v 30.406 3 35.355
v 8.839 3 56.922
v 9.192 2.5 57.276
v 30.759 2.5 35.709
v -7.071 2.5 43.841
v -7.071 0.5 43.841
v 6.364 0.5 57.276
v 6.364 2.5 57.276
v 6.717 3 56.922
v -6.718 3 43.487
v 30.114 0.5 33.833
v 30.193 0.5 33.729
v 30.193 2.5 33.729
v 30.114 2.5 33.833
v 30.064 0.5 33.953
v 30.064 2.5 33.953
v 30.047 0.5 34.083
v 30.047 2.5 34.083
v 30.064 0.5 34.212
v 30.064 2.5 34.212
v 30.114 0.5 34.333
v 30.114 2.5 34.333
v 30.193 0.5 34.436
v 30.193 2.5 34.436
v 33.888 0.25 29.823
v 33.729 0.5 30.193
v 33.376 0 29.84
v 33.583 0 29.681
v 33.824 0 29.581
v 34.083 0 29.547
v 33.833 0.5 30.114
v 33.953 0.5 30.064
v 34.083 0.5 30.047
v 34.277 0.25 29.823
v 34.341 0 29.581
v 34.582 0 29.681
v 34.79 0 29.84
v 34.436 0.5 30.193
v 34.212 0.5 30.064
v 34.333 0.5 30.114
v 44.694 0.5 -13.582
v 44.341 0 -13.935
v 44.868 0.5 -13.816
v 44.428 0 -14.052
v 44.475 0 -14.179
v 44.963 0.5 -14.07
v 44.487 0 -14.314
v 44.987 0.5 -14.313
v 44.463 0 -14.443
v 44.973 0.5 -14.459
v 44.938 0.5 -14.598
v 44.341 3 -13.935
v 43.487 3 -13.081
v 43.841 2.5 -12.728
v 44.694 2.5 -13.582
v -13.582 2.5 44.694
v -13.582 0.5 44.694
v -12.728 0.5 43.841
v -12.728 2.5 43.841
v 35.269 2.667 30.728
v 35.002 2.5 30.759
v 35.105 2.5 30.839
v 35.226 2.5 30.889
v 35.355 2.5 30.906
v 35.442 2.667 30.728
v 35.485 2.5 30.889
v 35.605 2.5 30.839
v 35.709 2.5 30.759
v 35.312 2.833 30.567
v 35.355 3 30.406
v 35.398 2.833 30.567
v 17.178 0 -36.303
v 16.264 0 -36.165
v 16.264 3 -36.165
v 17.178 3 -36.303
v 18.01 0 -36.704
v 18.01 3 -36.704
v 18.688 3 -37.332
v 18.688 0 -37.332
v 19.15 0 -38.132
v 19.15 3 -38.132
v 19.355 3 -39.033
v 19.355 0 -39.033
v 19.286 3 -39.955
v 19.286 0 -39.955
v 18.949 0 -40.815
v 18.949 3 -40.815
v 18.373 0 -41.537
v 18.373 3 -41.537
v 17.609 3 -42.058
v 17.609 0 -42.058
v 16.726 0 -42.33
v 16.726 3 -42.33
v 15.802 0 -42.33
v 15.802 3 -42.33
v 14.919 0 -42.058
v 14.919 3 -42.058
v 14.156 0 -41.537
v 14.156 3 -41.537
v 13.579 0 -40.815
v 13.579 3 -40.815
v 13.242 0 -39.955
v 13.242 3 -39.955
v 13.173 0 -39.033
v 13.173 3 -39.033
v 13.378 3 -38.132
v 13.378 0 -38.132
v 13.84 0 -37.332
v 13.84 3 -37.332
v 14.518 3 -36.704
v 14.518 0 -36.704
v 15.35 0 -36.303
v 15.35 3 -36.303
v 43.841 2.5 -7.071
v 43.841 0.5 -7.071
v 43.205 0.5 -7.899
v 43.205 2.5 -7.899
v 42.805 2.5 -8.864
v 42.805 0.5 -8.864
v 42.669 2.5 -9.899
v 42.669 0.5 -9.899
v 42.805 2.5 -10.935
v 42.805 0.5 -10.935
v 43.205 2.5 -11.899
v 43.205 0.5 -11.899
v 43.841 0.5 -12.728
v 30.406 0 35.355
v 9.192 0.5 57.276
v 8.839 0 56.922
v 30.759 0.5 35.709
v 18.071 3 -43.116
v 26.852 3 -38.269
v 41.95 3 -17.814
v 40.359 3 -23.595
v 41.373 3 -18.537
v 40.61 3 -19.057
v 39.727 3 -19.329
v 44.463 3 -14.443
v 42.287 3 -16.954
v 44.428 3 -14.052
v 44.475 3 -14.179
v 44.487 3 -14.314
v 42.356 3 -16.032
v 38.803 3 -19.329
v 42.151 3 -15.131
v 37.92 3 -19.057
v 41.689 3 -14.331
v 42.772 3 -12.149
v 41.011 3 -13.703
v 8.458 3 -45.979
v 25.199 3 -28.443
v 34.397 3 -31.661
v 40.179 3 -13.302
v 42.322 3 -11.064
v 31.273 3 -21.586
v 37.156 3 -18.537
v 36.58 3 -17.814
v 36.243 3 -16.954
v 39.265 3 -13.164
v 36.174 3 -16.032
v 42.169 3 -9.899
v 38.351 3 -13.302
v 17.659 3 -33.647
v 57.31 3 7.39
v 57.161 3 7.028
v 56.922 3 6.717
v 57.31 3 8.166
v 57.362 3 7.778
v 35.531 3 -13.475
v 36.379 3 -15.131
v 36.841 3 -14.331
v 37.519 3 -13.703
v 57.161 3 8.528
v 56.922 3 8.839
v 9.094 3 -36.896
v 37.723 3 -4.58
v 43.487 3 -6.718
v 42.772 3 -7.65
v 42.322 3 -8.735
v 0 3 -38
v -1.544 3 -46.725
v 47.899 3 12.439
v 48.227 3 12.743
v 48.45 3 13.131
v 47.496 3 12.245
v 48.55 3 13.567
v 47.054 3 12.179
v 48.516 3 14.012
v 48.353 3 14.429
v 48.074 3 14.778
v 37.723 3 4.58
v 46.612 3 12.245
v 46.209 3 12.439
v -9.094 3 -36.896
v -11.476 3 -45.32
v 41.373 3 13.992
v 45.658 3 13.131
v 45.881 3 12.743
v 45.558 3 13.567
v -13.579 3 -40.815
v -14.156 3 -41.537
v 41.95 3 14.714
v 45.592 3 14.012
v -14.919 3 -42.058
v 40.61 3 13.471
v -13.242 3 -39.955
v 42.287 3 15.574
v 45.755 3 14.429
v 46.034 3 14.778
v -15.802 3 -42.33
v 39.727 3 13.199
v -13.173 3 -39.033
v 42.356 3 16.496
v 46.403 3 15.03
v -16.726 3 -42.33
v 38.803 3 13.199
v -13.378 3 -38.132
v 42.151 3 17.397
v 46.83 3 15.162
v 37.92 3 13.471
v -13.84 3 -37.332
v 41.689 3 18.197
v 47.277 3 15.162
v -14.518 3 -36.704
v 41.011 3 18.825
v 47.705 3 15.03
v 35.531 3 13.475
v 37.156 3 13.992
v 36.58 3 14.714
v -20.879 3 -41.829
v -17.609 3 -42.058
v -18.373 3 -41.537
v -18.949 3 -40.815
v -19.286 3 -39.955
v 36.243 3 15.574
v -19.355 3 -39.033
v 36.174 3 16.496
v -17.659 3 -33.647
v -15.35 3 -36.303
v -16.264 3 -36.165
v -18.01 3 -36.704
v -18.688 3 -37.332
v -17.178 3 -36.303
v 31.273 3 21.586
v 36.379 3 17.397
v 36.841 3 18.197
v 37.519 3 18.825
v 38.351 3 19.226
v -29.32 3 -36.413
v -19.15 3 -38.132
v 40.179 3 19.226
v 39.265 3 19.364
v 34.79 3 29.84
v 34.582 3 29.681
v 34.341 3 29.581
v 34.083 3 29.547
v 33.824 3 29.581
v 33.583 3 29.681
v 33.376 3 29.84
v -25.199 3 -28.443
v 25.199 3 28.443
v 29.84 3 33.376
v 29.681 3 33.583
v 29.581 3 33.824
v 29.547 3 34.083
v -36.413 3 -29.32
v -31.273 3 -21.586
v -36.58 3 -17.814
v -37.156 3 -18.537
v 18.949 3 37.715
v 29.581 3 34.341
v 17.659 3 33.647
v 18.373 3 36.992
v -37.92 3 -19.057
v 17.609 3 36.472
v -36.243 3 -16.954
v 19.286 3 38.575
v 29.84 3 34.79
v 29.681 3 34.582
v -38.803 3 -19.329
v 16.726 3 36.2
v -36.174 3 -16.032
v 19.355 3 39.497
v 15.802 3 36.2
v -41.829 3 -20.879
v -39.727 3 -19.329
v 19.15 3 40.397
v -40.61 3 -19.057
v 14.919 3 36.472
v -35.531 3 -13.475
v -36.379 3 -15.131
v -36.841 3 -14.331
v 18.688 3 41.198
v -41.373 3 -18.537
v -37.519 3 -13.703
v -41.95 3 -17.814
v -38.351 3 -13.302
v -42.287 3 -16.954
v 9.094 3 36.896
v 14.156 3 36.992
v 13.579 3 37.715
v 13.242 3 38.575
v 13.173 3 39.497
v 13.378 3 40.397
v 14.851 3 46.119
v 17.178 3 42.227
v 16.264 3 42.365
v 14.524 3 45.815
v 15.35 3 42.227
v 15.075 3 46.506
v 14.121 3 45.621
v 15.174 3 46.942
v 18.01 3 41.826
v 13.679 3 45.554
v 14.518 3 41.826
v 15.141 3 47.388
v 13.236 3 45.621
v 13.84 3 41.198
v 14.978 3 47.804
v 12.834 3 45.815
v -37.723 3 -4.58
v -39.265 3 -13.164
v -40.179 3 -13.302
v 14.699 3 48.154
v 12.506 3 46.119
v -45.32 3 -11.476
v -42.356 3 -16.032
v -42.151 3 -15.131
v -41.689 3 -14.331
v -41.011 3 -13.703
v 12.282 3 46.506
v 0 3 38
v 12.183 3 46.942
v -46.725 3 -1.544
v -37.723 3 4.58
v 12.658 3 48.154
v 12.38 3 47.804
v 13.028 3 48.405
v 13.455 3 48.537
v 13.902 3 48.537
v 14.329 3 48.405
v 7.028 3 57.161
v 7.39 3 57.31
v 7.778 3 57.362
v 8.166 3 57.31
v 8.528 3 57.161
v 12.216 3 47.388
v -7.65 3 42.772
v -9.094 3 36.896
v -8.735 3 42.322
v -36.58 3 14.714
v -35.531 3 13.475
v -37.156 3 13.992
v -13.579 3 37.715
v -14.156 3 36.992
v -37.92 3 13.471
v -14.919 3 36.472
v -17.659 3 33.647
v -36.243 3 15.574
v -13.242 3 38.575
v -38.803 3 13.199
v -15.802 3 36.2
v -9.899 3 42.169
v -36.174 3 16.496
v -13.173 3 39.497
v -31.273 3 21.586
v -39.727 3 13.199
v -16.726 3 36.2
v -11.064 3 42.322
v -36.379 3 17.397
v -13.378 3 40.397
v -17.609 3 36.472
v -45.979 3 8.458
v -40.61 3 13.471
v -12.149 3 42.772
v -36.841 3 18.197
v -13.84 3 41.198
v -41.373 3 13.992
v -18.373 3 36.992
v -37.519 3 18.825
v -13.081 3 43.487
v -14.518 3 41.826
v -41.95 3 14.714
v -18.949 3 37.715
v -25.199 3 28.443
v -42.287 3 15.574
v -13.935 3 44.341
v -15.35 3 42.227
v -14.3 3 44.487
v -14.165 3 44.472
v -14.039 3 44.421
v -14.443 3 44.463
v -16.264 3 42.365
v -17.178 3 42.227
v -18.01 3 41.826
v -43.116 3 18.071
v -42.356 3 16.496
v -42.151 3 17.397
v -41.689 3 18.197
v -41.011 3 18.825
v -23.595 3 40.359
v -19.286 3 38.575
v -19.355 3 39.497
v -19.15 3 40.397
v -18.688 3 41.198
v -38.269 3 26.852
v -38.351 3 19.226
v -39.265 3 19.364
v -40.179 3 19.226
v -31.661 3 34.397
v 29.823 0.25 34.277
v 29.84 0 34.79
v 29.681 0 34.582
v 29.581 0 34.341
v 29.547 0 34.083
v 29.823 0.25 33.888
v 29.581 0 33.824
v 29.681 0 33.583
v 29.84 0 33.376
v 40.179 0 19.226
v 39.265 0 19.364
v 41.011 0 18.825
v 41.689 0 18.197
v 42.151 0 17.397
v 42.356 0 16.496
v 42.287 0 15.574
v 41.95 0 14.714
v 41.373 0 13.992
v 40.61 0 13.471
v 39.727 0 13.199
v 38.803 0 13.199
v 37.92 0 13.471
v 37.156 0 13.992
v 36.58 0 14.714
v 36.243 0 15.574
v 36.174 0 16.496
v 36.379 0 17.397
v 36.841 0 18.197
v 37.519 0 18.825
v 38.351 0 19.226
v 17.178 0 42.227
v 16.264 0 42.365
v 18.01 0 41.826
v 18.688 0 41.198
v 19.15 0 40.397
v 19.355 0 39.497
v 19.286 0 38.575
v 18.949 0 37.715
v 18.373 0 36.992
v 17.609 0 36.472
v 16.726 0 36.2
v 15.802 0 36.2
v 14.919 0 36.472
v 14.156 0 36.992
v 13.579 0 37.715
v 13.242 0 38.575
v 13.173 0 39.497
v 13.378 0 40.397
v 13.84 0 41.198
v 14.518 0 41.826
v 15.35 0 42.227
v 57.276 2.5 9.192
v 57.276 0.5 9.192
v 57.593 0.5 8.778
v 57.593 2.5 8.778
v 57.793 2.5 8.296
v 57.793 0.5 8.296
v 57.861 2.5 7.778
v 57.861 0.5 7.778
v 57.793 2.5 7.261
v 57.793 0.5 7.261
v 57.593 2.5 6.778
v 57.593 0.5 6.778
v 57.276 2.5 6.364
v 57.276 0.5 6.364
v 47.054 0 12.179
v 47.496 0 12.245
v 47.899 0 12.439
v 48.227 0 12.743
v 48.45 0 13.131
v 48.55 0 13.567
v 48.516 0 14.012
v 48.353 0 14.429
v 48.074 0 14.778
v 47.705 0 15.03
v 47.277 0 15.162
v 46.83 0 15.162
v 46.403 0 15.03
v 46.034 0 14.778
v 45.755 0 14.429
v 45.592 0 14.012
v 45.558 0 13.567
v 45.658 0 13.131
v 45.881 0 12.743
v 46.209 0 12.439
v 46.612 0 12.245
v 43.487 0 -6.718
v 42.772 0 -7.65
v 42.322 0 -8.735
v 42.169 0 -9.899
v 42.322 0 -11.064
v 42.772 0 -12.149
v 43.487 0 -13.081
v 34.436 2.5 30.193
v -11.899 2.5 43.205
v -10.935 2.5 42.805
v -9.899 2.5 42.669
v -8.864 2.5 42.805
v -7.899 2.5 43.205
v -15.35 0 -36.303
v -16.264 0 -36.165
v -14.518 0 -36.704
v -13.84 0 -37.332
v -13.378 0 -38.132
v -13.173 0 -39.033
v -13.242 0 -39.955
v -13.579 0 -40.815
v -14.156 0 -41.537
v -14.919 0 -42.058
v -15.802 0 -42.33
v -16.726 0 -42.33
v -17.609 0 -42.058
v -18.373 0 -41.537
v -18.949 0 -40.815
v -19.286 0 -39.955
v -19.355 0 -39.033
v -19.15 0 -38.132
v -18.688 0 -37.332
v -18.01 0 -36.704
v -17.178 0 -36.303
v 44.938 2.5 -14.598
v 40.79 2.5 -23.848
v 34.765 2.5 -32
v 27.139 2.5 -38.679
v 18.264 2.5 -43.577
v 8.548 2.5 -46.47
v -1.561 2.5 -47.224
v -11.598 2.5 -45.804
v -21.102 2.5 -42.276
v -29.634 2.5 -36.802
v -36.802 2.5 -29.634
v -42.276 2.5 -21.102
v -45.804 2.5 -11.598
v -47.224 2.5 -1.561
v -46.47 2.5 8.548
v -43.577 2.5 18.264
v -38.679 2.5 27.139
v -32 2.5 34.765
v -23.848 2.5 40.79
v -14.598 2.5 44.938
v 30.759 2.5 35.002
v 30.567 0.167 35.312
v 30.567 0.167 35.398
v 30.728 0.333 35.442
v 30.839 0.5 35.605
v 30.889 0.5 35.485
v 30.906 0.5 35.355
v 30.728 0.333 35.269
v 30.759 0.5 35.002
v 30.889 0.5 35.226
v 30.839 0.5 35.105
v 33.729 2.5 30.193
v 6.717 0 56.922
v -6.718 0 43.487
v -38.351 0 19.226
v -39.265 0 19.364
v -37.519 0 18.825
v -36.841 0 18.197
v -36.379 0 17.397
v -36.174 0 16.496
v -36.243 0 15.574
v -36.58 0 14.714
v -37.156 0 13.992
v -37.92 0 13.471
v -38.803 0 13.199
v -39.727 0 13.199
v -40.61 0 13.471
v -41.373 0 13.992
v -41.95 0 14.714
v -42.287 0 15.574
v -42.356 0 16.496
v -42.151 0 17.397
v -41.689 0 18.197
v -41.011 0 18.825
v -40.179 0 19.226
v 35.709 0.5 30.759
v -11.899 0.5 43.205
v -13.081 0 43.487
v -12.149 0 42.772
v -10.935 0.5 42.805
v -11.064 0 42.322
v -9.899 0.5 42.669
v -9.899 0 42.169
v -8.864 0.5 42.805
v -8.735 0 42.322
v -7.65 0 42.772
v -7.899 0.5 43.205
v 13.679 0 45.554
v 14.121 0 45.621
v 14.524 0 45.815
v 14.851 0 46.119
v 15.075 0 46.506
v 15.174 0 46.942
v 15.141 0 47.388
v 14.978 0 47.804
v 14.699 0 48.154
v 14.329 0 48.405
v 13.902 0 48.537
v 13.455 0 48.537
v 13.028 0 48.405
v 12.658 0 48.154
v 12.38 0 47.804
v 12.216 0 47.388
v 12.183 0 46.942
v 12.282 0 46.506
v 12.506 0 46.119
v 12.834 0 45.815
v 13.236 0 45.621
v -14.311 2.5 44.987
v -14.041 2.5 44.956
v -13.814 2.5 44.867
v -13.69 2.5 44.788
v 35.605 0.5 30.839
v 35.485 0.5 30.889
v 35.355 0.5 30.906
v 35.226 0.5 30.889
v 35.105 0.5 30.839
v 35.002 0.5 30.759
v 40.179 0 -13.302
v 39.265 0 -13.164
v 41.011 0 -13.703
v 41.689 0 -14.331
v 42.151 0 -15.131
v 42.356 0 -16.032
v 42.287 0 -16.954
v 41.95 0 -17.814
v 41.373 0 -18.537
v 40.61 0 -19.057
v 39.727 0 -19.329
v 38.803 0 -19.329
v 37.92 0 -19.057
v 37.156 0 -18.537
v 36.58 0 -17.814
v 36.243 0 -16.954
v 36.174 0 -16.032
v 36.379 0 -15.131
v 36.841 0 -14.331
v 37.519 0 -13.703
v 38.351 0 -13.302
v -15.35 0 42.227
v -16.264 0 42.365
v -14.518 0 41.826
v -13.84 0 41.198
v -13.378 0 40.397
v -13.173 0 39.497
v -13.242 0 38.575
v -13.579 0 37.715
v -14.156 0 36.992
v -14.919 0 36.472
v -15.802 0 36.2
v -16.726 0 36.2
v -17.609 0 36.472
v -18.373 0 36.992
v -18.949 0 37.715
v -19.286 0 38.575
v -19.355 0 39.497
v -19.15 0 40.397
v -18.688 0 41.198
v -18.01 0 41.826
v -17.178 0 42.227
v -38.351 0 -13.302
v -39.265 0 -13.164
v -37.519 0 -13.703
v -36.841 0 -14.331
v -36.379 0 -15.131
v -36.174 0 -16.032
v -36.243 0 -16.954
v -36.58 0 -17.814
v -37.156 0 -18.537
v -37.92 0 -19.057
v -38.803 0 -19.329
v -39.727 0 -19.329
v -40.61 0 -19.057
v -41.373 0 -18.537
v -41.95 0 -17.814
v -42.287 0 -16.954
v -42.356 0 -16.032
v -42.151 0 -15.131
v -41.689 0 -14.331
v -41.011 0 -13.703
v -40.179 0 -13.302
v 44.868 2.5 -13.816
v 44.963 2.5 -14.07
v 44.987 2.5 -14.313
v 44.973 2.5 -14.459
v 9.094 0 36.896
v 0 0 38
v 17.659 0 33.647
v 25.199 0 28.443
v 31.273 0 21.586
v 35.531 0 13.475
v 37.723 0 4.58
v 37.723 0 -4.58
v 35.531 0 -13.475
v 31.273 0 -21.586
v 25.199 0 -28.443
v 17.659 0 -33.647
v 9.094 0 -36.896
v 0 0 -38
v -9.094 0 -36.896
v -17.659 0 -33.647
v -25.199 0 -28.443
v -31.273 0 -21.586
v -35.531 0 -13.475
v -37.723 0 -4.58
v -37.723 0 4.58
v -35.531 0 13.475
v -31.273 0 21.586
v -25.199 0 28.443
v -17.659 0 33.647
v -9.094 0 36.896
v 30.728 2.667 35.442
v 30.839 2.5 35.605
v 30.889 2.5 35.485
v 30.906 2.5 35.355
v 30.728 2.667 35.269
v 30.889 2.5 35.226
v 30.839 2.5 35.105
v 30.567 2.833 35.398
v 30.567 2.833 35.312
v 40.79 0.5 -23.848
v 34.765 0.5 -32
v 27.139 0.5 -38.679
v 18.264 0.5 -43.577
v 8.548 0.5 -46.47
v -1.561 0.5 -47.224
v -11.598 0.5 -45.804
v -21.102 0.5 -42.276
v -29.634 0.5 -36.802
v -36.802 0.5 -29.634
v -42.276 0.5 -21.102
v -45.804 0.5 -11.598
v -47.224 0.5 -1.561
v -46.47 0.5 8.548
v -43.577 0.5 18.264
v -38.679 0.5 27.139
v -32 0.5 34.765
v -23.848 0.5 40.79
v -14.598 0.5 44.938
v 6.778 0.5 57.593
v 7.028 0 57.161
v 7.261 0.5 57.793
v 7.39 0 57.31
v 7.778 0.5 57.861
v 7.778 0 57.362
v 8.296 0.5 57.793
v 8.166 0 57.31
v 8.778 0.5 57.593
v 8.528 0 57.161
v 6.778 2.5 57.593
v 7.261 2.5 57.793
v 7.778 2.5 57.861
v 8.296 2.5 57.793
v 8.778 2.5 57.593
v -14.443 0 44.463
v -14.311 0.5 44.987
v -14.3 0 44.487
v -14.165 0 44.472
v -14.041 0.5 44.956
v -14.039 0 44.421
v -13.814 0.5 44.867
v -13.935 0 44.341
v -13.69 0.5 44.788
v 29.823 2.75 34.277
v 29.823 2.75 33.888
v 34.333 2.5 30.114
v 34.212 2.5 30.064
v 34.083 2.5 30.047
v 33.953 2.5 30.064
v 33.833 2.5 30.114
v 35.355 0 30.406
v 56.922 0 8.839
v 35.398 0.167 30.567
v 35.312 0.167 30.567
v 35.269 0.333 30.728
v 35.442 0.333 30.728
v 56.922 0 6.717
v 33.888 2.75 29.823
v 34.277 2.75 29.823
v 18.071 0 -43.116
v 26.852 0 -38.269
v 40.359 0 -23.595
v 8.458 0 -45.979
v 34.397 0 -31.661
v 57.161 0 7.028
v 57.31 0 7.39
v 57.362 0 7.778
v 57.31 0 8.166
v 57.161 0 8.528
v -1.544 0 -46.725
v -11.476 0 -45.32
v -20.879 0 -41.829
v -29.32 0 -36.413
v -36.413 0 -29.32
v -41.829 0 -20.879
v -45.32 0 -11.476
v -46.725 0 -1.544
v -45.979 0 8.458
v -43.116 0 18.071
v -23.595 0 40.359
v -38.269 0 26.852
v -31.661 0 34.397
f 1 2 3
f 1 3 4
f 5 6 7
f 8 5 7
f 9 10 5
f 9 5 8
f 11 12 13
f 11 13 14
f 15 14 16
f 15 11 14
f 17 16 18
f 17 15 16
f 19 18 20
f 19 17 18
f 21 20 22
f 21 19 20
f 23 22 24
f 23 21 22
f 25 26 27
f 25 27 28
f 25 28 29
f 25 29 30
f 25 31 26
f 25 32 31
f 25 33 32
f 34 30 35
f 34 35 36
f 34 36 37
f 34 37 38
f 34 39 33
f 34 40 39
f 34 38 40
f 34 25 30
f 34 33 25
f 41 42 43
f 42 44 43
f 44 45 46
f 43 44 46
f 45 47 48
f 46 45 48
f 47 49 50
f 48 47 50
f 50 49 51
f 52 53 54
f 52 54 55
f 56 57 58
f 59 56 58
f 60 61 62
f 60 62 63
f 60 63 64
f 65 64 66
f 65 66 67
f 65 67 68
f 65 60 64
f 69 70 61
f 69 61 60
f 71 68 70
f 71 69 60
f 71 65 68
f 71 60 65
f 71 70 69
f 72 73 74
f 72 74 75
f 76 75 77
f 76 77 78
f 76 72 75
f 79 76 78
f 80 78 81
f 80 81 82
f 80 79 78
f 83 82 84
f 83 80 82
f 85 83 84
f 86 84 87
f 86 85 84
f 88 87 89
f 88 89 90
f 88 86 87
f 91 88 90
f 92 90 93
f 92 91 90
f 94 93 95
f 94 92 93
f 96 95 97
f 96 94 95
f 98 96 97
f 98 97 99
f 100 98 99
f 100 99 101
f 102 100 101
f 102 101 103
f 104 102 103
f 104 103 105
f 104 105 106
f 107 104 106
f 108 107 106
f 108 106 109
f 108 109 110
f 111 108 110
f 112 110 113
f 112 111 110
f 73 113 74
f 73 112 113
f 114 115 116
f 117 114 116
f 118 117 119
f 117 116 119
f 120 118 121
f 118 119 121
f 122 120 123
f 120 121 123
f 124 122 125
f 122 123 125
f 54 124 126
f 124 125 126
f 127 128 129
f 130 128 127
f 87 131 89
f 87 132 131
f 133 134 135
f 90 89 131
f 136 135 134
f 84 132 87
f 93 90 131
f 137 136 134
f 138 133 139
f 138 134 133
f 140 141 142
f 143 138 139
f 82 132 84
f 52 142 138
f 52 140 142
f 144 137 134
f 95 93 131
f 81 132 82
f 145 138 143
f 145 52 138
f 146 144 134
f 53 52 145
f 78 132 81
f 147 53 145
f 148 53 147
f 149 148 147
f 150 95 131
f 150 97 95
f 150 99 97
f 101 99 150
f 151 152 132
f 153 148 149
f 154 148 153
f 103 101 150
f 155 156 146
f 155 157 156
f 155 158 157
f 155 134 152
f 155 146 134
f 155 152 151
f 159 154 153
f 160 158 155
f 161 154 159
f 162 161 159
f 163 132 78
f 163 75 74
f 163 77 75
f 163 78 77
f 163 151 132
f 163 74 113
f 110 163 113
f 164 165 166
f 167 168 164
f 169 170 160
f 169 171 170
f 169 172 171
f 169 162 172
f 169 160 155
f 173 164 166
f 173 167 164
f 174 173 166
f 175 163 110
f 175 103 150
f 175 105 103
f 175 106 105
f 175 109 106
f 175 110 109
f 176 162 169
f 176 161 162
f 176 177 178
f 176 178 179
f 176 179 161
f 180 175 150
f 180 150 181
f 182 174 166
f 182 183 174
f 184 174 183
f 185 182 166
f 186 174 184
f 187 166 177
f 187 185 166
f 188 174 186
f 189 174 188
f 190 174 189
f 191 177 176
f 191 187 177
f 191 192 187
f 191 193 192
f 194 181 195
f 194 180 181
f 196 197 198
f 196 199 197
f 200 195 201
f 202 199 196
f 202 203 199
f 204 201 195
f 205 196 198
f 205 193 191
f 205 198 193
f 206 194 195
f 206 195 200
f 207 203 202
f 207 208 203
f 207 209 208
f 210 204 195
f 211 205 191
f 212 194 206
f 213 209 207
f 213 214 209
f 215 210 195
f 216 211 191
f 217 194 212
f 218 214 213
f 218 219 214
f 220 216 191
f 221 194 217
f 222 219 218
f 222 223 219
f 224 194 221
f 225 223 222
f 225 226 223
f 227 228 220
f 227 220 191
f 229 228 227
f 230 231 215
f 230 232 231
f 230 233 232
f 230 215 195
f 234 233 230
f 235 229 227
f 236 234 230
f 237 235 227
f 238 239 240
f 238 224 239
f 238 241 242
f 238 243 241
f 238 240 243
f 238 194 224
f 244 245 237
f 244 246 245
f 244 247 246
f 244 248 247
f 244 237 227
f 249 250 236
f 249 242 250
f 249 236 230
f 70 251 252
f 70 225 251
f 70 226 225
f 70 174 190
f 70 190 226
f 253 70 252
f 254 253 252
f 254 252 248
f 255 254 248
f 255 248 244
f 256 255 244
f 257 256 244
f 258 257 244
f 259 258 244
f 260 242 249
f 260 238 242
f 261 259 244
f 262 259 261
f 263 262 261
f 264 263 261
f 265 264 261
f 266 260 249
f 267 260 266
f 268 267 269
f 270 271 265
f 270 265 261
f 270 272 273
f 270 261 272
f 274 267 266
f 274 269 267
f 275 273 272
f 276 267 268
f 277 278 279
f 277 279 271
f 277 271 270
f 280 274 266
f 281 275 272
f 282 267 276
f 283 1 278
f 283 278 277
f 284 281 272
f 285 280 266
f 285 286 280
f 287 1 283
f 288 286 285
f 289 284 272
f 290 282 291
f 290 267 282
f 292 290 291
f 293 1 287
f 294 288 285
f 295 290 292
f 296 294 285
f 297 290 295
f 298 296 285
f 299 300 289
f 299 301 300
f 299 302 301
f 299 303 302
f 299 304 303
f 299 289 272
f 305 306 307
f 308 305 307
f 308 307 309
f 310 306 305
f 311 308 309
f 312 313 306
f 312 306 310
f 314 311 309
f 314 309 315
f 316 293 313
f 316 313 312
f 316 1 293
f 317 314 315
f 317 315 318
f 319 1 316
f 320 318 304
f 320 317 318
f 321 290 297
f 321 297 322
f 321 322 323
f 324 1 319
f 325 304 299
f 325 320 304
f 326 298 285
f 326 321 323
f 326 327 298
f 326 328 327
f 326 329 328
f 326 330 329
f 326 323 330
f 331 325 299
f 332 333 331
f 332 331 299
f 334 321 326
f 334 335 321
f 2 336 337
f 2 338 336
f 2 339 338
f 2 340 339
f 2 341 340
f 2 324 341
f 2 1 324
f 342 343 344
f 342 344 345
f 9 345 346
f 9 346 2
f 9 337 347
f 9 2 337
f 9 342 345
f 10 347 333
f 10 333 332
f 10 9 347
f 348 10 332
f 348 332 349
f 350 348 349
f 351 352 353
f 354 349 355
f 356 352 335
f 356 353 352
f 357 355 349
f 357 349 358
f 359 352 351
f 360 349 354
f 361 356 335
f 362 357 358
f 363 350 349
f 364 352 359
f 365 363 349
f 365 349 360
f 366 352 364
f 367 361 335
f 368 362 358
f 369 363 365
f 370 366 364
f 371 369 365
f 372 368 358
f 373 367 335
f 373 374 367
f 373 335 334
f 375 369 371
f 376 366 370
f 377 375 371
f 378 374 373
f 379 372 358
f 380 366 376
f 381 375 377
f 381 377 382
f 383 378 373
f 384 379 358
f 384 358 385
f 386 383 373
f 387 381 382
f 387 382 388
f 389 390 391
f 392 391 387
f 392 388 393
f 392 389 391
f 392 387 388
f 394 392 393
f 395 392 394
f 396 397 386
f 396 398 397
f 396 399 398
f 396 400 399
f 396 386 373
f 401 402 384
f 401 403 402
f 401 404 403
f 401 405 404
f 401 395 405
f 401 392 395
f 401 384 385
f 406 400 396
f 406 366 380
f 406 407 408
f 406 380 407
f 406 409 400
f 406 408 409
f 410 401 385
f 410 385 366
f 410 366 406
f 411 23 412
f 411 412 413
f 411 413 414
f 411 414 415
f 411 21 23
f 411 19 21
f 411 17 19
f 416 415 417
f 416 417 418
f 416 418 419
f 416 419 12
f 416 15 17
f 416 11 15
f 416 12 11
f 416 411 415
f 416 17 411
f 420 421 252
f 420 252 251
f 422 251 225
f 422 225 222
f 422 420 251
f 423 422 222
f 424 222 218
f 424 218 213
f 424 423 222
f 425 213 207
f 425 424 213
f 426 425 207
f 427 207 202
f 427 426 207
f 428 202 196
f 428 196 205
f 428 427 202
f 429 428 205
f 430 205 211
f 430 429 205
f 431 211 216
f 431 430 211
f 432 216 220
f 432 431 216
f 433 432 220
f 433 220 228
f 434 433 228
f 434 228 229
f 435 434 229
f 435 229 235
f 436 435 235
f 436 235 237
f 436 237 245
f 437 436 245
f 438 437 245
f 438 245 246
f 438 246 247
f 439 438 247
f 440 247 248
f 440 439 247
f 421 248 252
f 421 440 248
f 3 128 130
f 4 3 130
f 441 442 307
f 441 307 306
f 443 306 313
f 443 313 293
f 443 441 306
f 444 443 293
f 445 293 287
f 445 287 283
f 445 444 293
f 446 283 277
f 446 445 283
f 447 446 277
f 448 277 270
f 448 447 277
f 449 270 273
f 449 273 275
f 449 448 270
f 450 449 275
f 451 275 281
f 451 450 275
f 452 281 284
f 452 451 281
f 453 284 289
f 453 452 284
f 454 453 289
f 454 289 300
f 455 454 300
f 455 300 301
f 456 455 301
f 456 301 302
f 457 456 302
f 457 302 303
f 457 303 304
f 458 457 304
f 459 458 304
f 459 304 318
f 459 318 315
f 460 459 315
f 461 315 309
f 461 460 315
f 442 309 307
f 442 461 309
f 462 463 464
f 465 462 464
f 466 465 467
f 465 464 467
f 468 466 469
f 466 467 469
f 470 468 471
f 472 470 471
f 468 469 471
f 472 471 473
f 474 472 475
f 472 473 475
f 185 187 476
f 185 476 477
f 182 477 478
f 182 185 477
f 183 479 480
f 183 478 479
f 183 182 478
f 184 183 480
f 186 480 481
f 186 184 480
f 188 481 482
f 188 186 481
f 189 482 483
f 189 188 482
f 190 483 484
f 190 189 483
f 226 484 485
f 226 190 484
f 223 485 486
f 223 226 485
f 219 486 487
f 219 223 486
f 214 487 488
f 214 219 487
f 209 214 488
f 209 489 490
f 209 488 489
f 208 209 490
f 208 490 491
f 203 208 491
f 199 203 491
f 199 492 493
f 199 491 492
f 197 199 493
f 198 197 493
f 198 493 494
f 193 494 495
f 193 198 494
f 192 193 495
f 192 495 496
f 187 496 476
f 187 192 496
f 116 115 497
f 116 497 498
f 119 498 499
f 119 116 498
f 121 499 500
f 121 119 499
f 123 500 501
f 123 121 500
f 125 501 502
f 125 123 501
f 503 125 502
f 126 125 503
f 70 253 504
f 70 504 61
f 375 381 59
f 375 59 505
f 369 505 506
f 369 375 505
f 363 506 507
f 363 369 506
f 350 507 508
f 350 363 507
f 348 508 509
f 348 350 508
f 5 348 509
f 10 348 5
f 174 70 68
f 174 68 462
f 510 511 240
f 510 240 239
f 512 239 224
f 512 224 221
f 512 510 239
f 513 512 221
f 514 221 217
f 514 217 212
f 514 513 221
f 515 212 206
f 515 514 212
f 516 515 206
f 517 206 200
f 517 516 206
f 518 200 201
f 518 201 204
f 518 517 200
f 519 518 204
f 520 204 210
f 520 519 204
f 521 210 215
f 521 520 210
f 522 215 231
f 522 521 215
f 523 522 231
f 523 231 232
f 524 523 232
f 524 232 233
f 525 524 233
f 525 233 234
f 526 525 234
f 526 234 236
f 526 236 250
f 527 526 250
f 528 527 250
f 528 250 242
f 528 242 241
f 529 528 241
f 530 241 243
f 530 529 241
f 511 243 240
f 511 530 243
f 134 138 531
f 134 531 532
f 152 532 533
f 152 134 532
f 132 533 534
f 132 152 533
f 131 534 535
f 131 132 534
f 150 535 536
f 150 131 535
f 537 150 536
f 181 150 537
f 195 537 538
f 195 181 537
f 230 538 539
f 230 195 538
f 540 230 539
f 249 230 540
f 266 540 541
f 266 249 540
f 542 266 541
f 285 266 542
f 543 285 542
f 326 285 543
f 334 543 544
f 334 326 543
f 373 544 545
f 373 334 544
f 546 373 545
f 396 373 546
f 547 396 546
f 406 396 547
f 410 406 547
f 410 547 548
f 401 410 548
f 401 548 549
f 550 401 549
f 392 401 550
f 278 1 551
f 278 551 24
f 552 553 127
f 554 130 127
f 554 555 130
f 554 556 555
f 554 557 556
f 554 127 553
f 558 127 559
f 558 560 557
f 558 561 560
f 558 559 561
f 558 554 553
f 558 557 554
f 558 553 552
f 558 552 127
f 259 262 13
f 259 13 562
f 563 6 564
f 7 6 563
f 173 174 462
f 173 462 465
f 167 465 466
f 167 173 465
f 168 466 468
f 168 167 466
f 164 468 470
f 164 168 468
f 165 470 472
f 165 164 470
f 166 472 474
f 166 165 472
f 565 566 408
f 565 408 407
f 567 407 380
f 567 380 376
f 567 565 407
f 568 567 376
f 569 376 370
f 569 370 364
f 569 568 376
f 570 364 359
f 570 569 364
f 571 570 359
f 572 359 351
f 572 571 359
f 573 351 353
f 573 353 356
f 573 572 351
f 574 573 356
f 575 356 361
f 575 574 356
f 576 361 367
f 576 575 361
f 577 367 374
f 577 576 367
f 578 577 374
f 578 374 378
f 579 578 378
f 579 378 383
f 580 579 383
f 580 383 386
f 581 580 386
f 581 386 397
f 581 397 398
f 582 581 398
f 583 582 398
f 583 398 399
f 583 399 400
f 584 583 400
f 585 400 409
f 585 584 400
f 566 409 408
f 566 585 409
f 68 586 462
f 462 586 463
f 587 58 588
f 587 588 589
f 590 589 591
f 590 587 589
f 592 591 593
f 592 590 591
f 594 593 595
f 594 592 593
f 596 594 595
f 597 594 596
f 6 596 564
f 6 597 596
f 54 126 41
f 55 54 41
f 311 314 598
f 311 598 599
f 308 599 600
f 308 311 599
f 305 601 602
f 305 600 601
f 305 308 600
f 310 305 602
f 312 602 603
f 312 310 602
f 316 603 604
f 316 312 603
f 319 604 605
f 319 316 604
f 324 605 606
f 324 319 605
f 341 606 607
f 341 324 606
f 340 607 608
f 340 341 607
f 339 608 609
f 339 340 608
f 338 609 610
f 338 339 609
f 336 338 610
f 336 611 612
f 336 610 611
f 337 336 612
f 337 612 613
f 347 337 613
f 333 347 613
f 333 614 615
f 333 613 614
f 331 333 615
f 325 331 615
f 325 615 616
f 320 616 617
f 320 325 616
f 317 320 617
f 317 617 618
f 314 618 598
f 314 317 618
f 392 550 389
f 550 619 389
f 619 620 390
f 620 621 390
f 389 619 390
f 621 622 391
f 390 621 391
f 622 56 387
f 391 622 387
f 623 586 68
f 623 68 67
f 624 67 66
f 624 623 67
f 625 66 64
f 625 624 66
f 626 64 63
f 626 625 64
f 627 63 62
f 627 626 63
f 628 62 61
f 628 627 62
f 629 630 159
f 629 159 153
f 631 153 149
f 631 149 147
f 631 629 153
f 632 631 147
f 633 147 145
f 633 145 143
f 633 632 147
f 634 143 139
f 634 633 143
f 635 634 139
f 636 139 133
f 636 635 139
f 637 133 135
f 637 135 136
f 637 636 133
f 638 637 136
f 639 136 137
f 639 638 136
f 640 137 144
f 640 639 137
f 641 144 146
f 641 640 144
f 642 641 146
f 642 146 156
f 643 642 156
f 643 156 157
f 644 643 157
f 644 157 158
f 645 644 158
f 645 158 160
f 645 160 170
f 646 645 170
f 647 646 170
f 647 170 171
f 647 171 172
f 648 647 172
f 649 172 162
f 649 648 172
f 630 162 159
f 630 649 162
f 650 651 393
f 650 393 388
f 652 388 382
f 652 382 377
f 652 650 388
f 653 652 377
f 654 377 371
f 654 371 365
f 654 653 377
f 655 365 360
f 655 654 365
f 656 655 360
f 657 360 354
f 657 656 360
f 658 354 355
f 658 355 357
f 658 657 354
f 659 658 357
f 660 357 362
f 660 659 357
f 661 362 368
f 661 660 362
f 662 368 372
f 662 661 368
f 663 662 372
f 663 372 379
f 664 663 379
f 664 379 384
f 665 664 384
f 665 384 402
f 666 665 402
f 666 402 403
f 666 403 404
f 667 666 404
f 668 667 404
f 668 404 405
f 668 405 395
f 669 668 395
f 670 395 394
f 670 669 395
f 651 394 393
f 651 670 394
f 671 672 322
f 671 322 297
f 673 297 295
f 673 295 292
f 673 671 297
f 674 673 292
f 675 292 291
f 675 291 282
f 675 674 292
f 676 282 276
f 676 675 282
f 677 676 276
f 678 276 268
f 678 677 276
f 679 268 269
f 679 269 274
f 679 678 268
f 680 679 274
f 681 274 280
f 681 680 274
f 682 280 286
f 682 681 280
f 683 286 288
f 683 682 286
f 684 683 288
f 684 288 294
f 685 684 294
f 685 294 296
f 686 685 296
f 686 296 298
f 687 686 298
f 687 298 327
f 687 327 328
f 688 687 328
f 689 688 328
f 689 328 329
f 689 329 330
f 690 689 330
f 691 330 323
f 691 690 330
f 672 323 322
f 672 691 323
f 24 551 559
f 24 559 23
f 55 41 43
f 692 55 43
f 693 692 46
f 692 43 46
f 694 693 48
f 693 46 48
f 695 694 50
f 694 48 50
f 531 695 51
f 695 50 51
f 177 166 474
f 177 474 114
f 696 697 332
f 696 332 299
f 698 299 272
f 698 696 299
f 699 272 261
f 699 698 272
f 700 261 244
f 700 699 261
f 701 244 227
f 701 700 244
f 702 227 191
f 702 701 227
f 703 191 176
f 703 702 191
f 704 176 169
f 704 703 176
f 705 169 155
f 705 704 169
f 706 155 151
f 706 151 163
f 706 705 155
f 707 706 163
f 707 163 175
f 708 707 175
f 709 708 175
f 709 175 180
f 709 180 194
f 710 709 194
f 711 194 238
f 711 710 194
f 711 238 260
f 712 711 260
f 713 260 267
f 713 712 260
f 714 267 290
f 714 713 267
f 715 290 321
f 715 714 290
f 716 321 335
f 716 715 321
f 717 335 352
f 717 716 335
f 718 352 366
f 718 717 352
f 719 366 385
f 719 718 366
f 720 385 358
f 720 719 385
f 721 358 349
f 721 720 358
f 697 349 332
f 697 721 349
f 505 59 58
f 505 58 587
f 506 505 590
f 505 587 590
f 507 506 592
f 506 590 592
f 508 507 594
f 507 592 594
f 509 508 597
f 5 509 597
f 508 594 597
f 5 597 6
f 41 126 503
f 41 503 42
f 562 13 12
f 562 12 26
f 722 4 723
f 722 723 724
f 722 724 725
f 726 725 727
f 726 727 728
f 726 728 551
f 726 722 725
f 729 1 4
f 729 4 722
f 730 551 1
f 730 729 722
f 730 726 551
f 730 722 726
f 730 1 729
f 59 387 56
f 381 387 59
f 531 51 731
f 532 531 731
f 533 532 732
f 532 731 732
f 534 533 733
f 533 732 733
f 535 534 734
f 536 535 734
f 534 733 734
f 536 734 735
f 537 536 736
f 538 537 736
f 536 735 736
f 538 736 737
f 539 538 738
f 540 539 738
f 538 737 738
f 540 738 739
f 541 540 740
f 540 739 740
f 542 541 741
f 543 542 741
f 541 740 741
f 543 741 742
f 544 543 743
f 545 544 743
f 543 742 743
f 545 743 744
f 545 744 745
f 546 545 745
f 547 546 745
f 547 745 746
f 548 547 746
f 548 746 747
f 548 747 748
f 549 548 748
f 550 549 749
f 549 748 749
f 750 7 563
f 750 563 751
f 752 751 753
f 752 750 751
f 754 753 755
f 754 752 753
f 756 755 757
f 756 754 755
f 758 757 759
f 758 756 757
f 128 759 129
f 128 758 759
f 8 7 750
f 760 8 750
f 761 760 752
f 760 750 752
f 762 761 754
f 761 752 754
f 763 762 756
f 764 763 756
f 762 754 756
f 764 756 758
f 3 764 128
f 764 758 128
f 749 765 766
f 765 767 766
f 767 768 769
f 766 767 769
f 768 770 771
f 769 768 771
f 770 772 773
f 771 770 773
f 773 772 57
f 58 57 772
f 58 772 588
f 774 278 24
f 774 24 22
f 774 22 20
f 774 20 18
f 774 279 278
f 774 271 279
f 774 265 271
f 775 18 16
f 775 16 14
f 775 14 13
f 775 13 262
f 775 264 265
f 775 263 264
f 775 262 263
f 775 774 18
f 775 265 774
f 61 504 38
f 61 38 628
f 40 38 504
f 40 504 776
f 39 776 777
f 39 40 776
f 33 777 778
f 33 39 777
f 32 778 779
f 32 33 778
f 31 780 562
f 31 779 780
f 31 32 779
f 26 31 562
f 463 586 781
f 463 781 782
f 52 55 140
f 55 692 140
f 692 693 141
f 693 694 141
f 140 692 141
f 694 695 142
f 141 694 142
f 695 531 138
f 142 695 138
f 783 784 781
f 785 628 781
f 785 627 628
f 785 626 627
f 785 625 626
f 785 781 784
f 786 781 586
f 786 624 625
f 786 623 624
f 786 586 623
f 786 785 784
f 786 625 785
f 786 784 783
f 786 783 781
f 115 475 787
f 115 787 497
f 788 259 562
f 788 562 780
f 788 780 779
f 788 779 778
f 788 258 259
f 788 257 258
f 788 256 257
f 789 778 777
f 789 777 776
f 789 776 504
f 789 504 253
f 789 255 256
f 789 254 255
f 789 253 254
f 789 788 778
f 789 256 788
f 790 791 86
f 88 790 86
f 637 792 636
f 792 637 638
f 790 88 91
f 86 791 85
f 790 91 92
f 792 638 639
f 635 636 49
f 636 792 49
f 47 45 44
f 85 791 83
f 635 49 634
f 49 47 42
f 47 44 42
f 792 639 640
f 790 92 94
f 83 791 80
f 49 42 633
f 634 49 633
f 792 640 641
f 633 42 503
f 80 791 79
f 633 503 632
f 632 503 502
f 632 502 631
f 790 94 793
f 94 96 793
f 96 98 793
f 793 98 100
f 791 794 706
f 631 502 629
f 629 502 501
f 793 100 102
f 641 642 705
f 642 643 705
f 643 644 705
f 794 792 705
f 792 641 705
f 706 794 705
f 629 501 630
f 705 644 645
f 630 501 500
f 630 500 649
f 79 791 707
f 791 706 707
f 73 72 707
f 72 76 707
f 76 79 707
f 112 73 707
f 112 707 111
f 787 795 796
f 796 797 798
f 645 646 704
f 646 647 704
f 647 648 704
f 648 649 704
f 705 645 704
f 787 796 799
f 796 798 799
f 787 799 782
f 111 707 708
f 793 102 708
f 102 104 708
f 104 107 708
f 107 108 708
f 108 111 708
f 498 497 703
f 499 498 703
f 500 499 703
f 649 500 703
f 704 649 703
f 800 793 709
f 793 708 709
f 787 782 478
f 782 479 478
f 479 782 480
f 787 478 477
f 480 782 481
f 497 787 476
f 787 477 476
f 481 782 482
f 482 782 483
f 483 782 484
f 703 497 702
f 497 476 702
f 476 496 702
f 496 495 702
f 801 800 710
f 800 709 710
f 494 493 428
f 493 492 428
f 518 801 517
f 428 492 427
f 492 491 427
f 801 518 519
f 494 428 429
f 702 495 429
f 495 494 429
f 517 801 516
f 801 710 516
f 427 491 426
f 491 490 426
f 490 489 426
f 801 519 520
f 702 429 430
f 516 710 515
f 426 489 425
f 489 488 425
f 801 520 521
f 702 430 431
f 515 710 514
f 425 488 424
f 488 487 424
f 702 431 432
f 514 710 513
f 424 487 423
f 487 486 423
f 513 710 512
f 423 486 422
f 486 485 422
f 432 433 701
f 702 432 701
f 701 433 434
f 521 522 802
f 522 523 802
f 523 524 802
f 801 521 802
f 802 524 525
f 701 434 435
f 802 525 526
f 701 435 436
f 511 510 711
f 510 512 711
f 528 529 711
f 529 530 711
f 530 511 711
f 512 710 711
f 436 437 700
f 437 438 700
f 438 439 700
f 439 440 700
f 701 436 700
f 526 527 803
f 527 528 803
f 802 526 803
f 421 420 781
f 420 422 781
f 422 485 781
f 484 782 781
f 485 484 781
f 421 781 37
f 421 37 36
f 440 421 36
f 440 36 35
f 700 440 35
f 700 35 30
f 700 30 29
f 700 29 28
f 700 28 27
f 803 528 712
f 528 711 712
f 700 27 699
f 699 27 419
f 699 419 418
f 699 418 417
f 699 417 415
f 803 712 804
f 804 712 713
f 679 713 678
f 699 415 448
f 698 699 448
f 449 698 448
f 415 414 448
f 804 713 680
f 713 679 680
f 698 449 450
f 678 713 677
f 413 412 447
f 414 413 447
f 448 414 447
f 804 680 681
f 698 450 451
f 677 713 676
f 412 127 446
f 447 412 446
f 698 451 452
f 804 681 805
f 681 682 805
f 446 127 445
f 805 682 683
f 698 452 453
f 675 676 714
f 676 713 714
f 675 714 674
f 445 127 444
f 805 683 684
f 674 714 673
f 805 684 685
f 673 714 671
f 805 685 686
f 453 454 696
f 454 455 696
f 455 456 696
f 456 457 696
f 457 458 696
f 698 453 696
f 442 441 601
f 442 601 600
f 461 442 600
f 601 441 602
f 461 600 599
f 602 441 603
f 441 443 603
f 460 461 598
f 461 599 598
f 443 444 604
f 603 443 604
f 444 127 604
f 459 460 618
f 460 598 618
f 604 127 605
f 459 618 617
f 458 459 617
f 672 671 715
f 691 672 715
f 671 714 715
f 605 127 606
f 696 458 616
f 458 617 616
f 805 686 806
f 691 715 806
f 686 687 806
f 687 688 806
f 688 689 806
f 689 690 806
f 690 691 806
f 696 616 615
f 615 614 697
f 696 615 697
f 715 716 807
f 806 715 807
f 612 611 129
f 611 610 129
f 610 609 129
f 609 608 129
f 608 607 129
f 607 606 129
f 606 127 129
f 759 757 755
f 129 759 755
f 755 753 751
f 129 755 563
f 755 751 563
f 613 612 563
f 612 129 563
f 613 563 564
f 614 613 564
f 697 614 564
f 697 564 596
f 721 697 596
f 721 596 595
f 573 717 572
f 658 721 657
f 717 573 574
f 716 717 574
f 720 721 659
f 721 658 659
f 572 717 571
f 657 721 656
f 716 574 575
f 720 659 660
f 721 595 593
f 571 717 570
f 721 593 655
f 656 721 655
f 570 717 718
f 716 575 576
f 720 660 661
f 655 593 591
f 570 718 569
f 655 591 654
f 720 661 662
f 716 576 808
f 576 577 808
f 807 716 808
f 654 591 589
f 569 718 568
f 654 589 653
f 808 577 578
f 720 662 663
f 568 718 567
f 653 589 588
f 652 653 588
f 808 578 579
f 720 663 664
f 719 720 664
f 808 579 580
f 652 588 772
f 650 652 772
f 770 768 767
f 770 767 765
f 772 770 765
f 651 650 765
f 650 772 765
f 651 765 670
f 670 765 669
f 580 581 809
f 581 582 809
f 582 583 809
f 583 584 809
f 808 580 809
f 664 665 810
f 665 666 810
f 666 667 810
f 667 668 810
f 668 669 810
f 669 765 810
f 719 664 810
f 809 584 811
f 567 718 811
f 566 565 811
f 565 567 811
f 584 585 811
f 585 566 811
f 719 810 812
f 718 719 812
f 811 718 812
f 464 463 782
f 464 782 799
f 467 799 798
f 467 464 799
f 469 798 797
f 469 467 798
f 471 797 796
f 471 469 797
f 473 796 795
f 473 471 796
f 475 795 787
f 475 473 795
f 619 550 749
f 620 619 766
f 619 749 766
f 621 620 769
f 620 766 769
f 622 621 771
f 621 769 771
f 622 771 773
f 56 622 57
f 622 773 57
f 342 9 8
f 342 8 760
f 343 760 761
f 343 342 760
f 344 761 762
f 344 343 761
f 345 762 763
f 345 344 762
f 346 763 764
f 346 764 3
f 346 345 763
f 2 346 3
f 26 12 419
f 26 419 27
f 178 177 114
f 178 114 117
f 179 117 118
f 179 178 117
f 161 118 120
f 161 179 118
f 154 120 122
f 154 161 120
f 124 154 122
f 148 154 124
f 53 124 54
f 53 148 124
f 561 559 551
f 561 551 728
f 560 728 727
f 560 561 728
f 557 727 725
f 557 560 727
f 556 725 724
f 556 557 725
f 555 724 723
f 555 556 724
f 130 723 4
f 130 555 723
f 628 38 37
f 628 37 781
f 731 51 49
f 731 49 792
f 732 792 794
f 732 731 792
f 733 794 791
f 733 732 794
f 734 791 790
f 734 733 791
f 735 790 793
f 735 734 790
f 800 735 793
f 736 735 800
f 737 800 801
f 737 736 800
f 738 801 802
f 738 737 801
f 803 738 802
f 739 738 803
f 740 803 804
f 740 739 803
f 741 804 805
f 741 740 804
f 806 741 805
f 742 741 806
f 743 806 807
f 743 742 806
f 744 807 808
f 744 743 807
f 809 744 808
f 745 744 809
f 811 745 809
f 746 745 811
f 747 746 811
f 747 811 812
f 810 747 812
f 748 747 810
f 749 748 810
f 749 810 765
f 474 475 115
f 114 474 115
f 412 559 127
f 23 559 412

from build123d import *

# Parameters (mm, degrees)
SKETCH_1_R               = 47.25
SKETCH_1_R_2             = 38
SKETCH_1_R_3             = 3.1
EXTRUDE_1_DEPTH          = 3
CUT_EXTRUDE_1_DEPTH      = 67.888900425
CUT_EXTRUDE_1_DEPTH_BACK = 67.888900425
EXTRUDE_2_DEPTH          = 3
FILLET_1_R               = 1
CUT_EXTRUDE_2_DEPTH      = 82.883401917
CUT_EXTRUDE_2_DEPTH_BACK = 82.883401917
FILLET_2_R               = 0.5
CHAMFER_1_SIZE           = 0.5
CUT_EXTRUDE_3_DEPTH      = 82.883401775
CUT_EXTRUDE_3_DEPTH_BACK = 82.883401775
SKETCH_7_R               = 1.5
CUT_EXTRUDE_4_DEPTH      = 82.883401775
CUT_EXTRUDE_4_DEPTH_BACK = 82.883401775
SKETCH_8_R               = 1.5


with BuildPart() as part:
    # 草图1 → 凸台-拉伸1 (new body)
    with BuildSketch(Plane(origin=(0, 0, 0), x_dir=(1, 0, 0), z_dir=(0, 1, 0))):
        with Locations(Location((0, 0, 0), (0, 0, 270))):
            Circle(SKETCH_1_R)
        with Locations(Location((0, 0, 0), (0, 0, 270))):
            Circle(SKETCH_1_R_2, mode=Mode.SUBTRACT)
        with Locations(Location((-16.264045876, 39.264880132, 0), (0, 0, 270))):
            Circle(SKETCH_1_R_3, mode=Mode.SUBTRACT)
        with Locations(Location((16.264045876, 39.264880132, 0), (0, 0, 270))):
            Circle(SKETCH_1_R_3, mode=Mode.SUBTRACT)
        with Locations(Location((39.264880132, 16.264045876, 0), (0, 0, 270))):
            Circle(SKETCH_1_R_3, mode=Mode.SUBTRACT)
        with Locations(Location((39.264880132, -16.264045876, 0), (0, 0, 270))):
            Circle(SKETCH_1_R_3, mode=Mode.SUBTRACT)
        with Locations(Location((16.264045876, -39.264880132, 0), (0, 0, 270))):
            Circle(SKETCH_1_R_3, mode=Mode.SUBTRACT)
        with Locations(Location((-16.264045876, -39.264880132, 0), (0, 0, 270))):
            Circle(SKETCH_1_R_3, mode=Mode.SUBTRACT)
        with Locations(Location((-39.264880132, -16.264045876, 0), (0, 0, 270))):
            Circle(SKETCH_1_R_3, mode=Mode.SUBTRACT)
        with Locations(Location((-39.264880132, 16.264045876, 0), (0, 0, 270))):
            Circle(SKETCH_1_R_3, mode=Mode.SUBTRACT)
    extrude(amount=EXTRUDE_1_DEPTH)

    # 草图4 → 切除-拉伸1 (cut, two sides: drawn at the far end of the back side and taken through both)
    with BuildSketch(Plane(origin=(0, 3, 0), x_dir=(1, 0, 0), z_dir=(0, 1, 0)).offset(-CUT_EXTRUDE_1_DEPTH_BACK)):
        with BuildLine():
            Line((43.840620434, 12.727922061), (44.719682329, 13.606983957))
            ThreePointArc((44.719682329, 13.606983957), (45.806880456, 15.618172507), (45.614922333, 17.896336511))
            Line((45.614922333, 17.896336511), (84.379499133, 11.829199362))
            Line((84.379499133, 11.829199362), (6.001901693, -69.182953765))
            Line((6.001901693, -69.182953765), (-17.896336511, -45.614922333))
            ThreePointArc((-17.896336511, -45.614922333), (-15.618172507, -45.806880456), (-13.606983957, -44.719682329))
            Line((-13.606983957, -44.719682329), (-12.727922061, -43.840620434))
            ThreePointArc((-12.727922061, -43.840620434), (-9.899494937, -42.669047558), (-7.071067812, -43.840620434))
            Line((-7.071067812, -43.840620434), (6.363961031, -57.275649276))
            ThreePointArc((6.363961031, -57.275649276), (7.778174593, -57.861435714), (9.192388155, -57.275649276))
            Line((9.192388155, -57.275649276), (57.275649276, -9.192388155))
            ThreePointArc((57.275649276, -9.192388155), (57.861435714, -7.778174593), (57.275649276, -6.363961031))
            Line((57.275649276, -6.363961031), (43.840620434, 7.071067812))
            ThreePointArc((43.840620434, 7.071067812), (42.669047558, 9.899494937), (43.840620434, 12.727922061))
        make_face()
    extrude(amount=CUT_EXTRUDE_1_DEPTH + CUT_EXTRUDE_1_DEPTH_BACK, mode=Mode.SUBTRACT)

    # 草图5 → 凸台-拉伸2 (add)
    with BuildSketch(Plane.XZ):
        with BuildLine():
            Line((57.275649276, 6.363961031), (43.840620434, -7.071067812))
            ThreePointArc((43.840620434, -7.071067812), (33.021886933, 33.021886933), (-7.071067812, 43.840620434))
            Line((-7.071067812, 43.840620434), (6.363961031, 57.275649276))
            ThreePointArc((6.363961031, 57.275649276), (7.778174593, 57.861435714), (9.192388155, 57.275649276))
            Line((9.192388155, 57.275649276), (57.275649276, 9.192388155))
            ThreePointArc((57.275649276, 9.192388155), (57.861435714, 7.778174593), (57.275649276, 6.363961031))
        make_face()
    extrude(amount=-EXTRUDE_2_DEPTH)

    # 圆角1
    fillet_1_edges = [part.edges().sort_by_distance(p)[0] for p in [
        (45.109607697, 1.5, -14.060078003),
        (-14.060078003, 1.5, 45.109607697),
    ]]
    fillet(fillet_1_edges, radius=FILLET_1_R)

    # 草图6 → 切除-拉伸2 (cut, two sides: drawn at the far end of the back side and taken through both)
    with BuildSketch(Plane.XZ.offset(-CUT_EXTRUDE_2_DEPTH_BACK)):
        Polygon((29.839906166, 34.082546853), (34.082546853, 29.839906166), (35.355339059, 31.112698372), (31.112698372, 35.355339059), align=None)
    extrude(amount=CUT_EXTRUDE_2_DEPTH + CUT_EXTRUDE_2_DEPTH_BACK, mode=Mode.SUBTRACT)

    # 圆角2
    fillet_2_edges = [part.edges().sort_by_distance(p)[0] for p in [
        (34.082546853, 1.5, 29.839906166),
        (31.112698372, 1.5, 35.355339059),
        (35.355339059, 1.5, 31.112698372),
        (29.839906166, 1.5, 34.082546853),
    ]]
    fillet(fillet_2_edges, radius=FILLET_2_R)

    # 倒角1
    chamfer_1_edges = [part.edges().sort_by_distance(p)[0] for p in [
        (57.861435714, 0, 7.778174593),
        (7.778174593, 0, 57.861435714),
        (7.778174593, 3, 57.861435714),
        (57.861435714, 3, 7.778174593),
        (-33.410795411, 3, -33.410795411),
        (-33.410795411, 0, -33.410795411),
        (44.267555216, 0, -13.154856844),
        (-14.055418364, 0, 44.959744811),
        (44.959744811, 0, -14.055418364),
        (44.267555216, 3, -13.154856844),
        (-14.055418364, 3, 44.959744811),
        (44.959744811, 3, -14.055418364),
        (34.718942956, 0, 30.476302269),
        (31.96122651, 0, 31.96122651),
        (30.476302269, 0, 34.718942956),
        (19.975766569, 0, 46.492270863),
        (30.905591591, 0, 35.355339059),
        (35.355339059, 0, 30.905591591),
        (34.718942956, 3, 30.476302269),
        (19.975766569, 3, 46.492270863),
        (30.476302269, 3, 34.718942956),
        (31.96122651, 3, 31.96122651),
        (30.905591591, 3, 35.355339059),
        (35.355339059, 3, 30.905591591),
        (34.082546853, 0, 30.047012947),
        (34.082546853, 3, 30.047012947),
        (30.047012947, 0, 34.082546853),
        (30.047012947, 3, 34.082546853),
        (-0.353553391, 3, 50.558134855),
        (46.492270863, 0, 19.975766569),
        (50.558134855, 3, -0.353553391),
        (-13.154856844, 0, 44.267555216),
        (-9.899494937, 0, 42.669047558),
        (-0.353553391, 0, 50.558134855),
        (46.492270863, 3, 19.975766569),
        (50.558134855, 0, -0.353553391),
        (42.669047558, 0, -9.899494937),
        (42.669047558, 3, -9.899494937),
        (-9.899494937, 3, 42.669047558),
        (-13.154856844, 3, 44.267555216),
    ]]
    chamfer(chamfer_1_edges, length=CHAMFER_1_SIZE - 0.0001)  # a hair under: the kernel refuses the full size

    # 草图7 → 切除-拉伸3 (cut, two sides: drawn at the far end of the back side and taken through both)
    with BuildSketch(Plane.XZ.offset(-CUT_EXTRUDE_3_DEPTH_BACK)):
        with Locations(Location((13.678623105, 47.053925479, 0), (0, 0, 270))):
            Circle(SKETCH_7_R)
    extrude(amount=CUT_EXTRUDE_3_DEPTH + CUT_EXTRUDE_3_DEPTH_BACK, mode=Mode.SUBTRACT)

    # 草图8 → 切除-拉伸4 (cut, two sides: drawn at the far end of the back side and taken through both)
    with BuildSketch(Plane.XZ.offset(-CUT_EXTRUDE_4_DEPTH_BACK)):
        with Locations(Location((47.053925479, 13.678623105, 0), (0, 0, 270))):
            Circle(SKETCH_8_R)
    extrude(amount=CUT_EXTRUDE_4_DEPTH + CUT_EXTRUDE_4_DEPTH_BACK, mode=Mode.SUBTRACT)


solid = part.part
